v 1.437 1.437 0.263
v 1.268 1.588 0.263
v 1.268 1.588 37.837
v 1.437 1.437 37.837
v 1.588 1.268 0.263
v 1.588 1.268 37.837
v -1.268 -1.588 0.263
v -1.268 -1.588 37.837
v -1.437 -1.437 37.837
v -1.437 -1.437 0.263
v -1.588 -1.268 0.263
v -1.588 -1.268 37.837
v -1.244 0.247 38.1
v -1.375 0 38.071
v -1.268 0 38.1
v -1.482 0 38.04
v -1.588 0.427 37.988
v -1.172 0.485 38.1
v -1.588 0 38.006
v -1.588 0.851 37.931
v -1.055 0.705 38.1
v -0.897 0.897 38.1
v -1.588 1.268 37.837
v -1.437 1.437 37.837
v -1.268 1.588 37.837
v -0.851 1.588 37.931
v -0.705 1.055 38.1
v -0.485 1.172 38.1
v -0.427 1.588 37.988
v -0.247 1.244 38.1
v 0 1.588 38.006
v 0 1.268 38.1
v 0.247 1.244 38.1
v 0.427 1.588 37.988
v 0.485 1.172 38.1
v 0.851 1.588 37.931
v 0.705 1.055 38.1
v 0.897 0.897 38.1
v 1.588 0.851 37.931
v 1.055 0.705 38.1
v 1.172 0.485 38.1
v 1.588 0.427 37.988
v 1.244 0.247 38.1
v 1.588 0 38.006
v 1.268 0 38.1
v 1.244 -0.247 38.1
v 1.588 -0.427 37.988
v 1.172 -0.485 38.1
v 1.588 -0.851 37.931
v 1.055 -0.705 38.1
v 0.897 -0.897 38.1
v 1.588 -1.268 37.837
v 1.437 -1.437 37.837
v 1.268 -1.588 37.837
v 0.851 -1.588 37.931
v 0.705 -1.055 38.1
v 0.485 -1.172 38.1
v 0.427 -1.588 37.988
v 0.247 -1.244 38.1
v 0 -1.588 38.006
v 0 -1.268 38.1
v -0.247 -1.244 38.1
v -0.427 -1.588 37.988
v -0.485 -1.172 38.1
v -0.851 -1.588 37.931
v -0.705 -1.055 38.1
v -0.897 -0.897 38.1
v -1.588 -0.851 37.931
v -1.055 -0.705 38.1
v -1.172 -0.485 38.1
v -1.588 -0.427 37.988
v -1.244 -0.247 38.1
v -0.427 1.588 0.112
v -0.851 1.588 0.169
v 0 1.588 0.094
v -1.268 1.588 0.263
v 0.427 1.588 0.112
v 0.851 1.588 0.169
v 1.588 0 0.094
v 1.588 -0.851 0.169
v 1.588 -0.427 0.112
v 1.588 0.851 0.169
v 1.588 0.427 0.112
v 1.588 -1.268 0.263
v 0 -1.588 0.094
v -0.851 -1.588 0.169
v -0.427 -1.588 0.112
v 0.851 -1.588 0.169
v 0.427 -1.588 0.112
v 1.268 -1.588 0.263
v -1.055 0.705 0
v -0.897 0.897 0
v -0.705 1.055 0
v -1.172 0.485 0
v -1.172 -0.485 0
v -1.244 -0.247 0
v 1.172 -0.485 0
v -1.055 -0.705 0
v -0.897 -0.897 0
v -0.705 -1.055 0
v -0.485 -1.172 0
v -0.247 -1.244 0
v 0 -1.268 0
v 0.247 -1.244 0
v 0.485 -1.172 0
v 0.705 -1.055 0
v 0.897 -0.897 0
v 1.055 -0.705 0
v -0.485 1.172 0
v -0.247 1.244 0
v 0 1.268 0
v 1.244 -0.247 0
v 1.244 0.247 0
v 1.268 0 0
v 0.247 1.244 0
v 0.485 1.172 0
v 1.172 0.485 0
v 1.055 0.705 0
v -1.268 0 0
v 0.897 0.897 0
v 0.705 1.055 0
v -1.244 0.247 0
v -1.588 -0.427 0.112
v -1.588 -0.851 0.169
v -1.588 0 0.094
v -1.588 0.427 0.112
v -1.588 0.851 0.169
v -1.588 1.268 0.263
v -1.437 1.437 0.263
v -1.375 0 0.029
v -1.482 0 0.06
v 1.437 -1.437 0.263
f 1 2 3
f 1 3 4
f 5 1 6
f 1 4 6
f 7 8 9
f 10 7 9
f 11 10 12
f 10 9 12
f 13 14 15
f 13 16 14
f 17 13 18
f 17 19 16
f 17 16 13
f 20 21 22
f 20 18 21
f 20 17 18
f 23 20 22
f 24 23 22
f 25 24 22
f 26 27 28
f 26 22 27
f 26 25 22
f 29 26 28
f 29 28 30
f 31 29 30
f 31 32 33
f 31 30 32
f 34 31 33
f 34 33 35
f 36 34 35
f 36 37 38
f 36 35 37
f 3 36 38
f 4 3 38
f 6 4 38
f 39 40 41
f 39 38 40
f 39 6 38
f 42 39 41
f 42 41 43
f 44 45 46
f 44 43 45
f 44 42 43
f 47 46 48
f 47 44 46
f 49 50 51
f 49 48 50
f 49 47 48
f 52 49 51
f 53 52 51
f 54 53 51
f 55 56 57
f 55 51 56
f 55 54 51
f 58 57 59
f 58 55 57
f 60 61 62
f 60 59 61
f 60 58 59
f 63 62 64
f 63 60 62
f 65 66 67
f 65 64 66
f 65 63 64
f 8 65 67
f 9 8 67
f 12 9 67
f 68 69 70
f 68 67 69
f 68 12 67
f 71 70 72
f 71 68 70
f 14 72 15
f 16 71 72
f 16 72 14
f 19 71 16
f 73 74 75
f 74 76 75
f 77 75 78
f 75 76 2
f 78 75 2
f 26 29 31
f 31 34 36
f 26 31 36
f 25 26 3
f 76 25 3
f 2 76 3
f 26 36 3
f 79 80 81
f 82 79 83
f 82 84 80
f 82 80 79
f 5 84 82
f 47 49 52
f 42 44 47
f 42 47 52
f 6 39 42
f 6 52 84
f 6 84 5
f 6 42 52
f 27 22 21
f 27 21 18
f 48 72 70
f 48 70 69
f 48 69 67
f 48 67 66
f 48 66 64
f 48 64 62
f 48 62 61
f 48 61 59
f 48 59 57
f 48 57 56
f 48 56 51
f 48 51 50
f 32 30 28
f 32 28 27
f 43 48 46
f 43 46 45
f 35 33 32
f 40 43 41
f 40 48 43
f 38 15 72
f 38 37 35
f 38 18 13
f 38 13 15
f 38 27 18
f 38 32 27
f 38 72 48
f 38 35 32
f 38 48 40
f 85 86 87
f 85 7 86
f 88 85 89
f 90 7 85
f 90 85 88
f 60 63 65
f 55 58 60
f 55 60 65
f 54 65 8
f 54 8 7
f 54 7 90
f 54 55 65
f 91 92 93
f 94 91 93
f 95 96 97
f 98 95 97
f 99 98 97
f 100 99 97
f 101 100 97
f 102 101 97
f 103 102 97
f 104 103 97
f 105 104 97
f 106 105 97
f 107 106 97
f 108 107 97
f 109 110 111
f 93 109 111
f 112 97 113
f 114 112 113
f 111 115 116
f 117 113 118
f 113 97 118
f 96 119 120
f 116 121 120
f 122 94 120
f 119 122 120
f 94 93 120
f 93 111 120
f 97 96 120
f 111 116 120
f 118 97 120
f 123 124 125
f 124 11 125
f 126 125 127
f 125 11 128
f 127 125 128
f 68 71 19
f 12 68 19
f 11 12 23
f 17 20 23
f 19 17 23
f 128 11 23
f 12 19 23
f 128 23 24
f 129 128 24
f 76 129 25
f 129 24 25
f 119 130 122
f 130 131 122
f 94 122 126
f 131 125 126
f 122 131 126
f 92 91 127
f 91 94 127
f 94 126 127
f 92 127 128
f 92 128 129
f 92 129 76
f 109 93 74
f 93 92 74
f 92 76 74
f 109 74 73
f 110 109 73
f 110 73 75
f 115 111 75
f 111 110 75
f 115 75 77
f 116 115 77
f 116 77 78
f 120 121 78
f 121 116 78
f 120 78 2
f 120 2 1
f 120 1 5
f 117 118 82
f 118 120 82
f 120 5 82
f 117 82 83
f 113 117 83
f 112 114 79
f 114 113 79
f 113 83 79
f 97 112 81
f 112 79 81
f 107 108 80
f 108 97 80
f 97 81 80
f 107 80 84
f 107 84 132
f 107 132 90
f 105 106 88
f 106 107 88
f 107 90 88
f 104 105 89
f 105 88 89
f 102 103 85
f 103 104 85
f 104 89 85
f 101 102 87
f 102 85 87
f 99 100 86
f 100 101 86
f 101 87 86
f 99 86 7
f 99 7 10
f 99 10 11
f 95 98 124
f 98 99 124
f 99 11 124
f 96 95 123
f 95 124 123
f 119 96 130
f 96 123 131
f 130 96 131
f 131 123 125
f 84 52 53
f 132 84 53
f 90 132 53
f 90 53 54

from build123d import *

# Parameters (mm, degrees)
SKETCH1_W           = 3.175
SKETCH1_H           = 3.175
BOSS_EXTRUDE1_DEPTH = 19.05
SKETCH2_OUTSIDE_W   = 9.088
SKETCH2_OUTSIDE_H   = 9.089
SKETCH2_OUTSIDE_R   = 2.032
CUT_EXTRUDE1_DEPTH  = 20.05


with BuildPart() as part:
    # Sketch1 → Boss-Extrude1 (new body)
    with BuildSketch(Plane.XY):
        Rectangle(SKETCH1_W, SKETCH1_H)
    extrude(amount=BOSS_EXTRUDE1_DEPTH)

    # Sketch2 outside → Cut-Extrude1 (cut, through all)
    with BuildSketch(Plane(origin=(0, 0, 0), x_dir=(-1, 0, 0), z_dir=(0, 0, -1))):
        with Locations((0, -0.0005)):
            Rectangle(SKETCH2_OUTSIDE_W, SKETCH2_OUTSIDE_H)
        Circle(SKETCH2_OUTSIDE_R, mode=Mode.SUBTRACT)
    extrude(amount=-CUT_EXTRUDE1_DEPTH, mode=Mode.SUBTRACT)

    # Sketch3 → Cut-Revolve1 (revolve, cut)
    with BuildSketch(Plane(origin=(0, 0, 0), x_dir=(1, 0, 0), z_dir=(0, 1, 0))):
        with BuildLine():
            Line((-5.053685963, -4.40273269), (-5.053685963, 5.740530545))
            Line((-5.053685963, 5.740530545), (0, 5.740530545))
            Line((0, 5.740530545), (0, 0.160877736))
            ThreePointArc((0, 0.160877736), (-3.404639553, -1.148866368), (-5.053685963, -4.40273269))
        make_face()
    revolve(axis=Axis((0, 0, 19.05), (0, 0, -1)), mode=Mode.SUBTRACT)

    # Mirror1: part across plane


with BuildPart() as part_1:
    add(part.part)
    add(part.part.mirror(Plane(origin=(0, 0, 19.05), x_dir=(1, 0, 0), z_dir=(0, 0, -1))))


solid = part_1.part
